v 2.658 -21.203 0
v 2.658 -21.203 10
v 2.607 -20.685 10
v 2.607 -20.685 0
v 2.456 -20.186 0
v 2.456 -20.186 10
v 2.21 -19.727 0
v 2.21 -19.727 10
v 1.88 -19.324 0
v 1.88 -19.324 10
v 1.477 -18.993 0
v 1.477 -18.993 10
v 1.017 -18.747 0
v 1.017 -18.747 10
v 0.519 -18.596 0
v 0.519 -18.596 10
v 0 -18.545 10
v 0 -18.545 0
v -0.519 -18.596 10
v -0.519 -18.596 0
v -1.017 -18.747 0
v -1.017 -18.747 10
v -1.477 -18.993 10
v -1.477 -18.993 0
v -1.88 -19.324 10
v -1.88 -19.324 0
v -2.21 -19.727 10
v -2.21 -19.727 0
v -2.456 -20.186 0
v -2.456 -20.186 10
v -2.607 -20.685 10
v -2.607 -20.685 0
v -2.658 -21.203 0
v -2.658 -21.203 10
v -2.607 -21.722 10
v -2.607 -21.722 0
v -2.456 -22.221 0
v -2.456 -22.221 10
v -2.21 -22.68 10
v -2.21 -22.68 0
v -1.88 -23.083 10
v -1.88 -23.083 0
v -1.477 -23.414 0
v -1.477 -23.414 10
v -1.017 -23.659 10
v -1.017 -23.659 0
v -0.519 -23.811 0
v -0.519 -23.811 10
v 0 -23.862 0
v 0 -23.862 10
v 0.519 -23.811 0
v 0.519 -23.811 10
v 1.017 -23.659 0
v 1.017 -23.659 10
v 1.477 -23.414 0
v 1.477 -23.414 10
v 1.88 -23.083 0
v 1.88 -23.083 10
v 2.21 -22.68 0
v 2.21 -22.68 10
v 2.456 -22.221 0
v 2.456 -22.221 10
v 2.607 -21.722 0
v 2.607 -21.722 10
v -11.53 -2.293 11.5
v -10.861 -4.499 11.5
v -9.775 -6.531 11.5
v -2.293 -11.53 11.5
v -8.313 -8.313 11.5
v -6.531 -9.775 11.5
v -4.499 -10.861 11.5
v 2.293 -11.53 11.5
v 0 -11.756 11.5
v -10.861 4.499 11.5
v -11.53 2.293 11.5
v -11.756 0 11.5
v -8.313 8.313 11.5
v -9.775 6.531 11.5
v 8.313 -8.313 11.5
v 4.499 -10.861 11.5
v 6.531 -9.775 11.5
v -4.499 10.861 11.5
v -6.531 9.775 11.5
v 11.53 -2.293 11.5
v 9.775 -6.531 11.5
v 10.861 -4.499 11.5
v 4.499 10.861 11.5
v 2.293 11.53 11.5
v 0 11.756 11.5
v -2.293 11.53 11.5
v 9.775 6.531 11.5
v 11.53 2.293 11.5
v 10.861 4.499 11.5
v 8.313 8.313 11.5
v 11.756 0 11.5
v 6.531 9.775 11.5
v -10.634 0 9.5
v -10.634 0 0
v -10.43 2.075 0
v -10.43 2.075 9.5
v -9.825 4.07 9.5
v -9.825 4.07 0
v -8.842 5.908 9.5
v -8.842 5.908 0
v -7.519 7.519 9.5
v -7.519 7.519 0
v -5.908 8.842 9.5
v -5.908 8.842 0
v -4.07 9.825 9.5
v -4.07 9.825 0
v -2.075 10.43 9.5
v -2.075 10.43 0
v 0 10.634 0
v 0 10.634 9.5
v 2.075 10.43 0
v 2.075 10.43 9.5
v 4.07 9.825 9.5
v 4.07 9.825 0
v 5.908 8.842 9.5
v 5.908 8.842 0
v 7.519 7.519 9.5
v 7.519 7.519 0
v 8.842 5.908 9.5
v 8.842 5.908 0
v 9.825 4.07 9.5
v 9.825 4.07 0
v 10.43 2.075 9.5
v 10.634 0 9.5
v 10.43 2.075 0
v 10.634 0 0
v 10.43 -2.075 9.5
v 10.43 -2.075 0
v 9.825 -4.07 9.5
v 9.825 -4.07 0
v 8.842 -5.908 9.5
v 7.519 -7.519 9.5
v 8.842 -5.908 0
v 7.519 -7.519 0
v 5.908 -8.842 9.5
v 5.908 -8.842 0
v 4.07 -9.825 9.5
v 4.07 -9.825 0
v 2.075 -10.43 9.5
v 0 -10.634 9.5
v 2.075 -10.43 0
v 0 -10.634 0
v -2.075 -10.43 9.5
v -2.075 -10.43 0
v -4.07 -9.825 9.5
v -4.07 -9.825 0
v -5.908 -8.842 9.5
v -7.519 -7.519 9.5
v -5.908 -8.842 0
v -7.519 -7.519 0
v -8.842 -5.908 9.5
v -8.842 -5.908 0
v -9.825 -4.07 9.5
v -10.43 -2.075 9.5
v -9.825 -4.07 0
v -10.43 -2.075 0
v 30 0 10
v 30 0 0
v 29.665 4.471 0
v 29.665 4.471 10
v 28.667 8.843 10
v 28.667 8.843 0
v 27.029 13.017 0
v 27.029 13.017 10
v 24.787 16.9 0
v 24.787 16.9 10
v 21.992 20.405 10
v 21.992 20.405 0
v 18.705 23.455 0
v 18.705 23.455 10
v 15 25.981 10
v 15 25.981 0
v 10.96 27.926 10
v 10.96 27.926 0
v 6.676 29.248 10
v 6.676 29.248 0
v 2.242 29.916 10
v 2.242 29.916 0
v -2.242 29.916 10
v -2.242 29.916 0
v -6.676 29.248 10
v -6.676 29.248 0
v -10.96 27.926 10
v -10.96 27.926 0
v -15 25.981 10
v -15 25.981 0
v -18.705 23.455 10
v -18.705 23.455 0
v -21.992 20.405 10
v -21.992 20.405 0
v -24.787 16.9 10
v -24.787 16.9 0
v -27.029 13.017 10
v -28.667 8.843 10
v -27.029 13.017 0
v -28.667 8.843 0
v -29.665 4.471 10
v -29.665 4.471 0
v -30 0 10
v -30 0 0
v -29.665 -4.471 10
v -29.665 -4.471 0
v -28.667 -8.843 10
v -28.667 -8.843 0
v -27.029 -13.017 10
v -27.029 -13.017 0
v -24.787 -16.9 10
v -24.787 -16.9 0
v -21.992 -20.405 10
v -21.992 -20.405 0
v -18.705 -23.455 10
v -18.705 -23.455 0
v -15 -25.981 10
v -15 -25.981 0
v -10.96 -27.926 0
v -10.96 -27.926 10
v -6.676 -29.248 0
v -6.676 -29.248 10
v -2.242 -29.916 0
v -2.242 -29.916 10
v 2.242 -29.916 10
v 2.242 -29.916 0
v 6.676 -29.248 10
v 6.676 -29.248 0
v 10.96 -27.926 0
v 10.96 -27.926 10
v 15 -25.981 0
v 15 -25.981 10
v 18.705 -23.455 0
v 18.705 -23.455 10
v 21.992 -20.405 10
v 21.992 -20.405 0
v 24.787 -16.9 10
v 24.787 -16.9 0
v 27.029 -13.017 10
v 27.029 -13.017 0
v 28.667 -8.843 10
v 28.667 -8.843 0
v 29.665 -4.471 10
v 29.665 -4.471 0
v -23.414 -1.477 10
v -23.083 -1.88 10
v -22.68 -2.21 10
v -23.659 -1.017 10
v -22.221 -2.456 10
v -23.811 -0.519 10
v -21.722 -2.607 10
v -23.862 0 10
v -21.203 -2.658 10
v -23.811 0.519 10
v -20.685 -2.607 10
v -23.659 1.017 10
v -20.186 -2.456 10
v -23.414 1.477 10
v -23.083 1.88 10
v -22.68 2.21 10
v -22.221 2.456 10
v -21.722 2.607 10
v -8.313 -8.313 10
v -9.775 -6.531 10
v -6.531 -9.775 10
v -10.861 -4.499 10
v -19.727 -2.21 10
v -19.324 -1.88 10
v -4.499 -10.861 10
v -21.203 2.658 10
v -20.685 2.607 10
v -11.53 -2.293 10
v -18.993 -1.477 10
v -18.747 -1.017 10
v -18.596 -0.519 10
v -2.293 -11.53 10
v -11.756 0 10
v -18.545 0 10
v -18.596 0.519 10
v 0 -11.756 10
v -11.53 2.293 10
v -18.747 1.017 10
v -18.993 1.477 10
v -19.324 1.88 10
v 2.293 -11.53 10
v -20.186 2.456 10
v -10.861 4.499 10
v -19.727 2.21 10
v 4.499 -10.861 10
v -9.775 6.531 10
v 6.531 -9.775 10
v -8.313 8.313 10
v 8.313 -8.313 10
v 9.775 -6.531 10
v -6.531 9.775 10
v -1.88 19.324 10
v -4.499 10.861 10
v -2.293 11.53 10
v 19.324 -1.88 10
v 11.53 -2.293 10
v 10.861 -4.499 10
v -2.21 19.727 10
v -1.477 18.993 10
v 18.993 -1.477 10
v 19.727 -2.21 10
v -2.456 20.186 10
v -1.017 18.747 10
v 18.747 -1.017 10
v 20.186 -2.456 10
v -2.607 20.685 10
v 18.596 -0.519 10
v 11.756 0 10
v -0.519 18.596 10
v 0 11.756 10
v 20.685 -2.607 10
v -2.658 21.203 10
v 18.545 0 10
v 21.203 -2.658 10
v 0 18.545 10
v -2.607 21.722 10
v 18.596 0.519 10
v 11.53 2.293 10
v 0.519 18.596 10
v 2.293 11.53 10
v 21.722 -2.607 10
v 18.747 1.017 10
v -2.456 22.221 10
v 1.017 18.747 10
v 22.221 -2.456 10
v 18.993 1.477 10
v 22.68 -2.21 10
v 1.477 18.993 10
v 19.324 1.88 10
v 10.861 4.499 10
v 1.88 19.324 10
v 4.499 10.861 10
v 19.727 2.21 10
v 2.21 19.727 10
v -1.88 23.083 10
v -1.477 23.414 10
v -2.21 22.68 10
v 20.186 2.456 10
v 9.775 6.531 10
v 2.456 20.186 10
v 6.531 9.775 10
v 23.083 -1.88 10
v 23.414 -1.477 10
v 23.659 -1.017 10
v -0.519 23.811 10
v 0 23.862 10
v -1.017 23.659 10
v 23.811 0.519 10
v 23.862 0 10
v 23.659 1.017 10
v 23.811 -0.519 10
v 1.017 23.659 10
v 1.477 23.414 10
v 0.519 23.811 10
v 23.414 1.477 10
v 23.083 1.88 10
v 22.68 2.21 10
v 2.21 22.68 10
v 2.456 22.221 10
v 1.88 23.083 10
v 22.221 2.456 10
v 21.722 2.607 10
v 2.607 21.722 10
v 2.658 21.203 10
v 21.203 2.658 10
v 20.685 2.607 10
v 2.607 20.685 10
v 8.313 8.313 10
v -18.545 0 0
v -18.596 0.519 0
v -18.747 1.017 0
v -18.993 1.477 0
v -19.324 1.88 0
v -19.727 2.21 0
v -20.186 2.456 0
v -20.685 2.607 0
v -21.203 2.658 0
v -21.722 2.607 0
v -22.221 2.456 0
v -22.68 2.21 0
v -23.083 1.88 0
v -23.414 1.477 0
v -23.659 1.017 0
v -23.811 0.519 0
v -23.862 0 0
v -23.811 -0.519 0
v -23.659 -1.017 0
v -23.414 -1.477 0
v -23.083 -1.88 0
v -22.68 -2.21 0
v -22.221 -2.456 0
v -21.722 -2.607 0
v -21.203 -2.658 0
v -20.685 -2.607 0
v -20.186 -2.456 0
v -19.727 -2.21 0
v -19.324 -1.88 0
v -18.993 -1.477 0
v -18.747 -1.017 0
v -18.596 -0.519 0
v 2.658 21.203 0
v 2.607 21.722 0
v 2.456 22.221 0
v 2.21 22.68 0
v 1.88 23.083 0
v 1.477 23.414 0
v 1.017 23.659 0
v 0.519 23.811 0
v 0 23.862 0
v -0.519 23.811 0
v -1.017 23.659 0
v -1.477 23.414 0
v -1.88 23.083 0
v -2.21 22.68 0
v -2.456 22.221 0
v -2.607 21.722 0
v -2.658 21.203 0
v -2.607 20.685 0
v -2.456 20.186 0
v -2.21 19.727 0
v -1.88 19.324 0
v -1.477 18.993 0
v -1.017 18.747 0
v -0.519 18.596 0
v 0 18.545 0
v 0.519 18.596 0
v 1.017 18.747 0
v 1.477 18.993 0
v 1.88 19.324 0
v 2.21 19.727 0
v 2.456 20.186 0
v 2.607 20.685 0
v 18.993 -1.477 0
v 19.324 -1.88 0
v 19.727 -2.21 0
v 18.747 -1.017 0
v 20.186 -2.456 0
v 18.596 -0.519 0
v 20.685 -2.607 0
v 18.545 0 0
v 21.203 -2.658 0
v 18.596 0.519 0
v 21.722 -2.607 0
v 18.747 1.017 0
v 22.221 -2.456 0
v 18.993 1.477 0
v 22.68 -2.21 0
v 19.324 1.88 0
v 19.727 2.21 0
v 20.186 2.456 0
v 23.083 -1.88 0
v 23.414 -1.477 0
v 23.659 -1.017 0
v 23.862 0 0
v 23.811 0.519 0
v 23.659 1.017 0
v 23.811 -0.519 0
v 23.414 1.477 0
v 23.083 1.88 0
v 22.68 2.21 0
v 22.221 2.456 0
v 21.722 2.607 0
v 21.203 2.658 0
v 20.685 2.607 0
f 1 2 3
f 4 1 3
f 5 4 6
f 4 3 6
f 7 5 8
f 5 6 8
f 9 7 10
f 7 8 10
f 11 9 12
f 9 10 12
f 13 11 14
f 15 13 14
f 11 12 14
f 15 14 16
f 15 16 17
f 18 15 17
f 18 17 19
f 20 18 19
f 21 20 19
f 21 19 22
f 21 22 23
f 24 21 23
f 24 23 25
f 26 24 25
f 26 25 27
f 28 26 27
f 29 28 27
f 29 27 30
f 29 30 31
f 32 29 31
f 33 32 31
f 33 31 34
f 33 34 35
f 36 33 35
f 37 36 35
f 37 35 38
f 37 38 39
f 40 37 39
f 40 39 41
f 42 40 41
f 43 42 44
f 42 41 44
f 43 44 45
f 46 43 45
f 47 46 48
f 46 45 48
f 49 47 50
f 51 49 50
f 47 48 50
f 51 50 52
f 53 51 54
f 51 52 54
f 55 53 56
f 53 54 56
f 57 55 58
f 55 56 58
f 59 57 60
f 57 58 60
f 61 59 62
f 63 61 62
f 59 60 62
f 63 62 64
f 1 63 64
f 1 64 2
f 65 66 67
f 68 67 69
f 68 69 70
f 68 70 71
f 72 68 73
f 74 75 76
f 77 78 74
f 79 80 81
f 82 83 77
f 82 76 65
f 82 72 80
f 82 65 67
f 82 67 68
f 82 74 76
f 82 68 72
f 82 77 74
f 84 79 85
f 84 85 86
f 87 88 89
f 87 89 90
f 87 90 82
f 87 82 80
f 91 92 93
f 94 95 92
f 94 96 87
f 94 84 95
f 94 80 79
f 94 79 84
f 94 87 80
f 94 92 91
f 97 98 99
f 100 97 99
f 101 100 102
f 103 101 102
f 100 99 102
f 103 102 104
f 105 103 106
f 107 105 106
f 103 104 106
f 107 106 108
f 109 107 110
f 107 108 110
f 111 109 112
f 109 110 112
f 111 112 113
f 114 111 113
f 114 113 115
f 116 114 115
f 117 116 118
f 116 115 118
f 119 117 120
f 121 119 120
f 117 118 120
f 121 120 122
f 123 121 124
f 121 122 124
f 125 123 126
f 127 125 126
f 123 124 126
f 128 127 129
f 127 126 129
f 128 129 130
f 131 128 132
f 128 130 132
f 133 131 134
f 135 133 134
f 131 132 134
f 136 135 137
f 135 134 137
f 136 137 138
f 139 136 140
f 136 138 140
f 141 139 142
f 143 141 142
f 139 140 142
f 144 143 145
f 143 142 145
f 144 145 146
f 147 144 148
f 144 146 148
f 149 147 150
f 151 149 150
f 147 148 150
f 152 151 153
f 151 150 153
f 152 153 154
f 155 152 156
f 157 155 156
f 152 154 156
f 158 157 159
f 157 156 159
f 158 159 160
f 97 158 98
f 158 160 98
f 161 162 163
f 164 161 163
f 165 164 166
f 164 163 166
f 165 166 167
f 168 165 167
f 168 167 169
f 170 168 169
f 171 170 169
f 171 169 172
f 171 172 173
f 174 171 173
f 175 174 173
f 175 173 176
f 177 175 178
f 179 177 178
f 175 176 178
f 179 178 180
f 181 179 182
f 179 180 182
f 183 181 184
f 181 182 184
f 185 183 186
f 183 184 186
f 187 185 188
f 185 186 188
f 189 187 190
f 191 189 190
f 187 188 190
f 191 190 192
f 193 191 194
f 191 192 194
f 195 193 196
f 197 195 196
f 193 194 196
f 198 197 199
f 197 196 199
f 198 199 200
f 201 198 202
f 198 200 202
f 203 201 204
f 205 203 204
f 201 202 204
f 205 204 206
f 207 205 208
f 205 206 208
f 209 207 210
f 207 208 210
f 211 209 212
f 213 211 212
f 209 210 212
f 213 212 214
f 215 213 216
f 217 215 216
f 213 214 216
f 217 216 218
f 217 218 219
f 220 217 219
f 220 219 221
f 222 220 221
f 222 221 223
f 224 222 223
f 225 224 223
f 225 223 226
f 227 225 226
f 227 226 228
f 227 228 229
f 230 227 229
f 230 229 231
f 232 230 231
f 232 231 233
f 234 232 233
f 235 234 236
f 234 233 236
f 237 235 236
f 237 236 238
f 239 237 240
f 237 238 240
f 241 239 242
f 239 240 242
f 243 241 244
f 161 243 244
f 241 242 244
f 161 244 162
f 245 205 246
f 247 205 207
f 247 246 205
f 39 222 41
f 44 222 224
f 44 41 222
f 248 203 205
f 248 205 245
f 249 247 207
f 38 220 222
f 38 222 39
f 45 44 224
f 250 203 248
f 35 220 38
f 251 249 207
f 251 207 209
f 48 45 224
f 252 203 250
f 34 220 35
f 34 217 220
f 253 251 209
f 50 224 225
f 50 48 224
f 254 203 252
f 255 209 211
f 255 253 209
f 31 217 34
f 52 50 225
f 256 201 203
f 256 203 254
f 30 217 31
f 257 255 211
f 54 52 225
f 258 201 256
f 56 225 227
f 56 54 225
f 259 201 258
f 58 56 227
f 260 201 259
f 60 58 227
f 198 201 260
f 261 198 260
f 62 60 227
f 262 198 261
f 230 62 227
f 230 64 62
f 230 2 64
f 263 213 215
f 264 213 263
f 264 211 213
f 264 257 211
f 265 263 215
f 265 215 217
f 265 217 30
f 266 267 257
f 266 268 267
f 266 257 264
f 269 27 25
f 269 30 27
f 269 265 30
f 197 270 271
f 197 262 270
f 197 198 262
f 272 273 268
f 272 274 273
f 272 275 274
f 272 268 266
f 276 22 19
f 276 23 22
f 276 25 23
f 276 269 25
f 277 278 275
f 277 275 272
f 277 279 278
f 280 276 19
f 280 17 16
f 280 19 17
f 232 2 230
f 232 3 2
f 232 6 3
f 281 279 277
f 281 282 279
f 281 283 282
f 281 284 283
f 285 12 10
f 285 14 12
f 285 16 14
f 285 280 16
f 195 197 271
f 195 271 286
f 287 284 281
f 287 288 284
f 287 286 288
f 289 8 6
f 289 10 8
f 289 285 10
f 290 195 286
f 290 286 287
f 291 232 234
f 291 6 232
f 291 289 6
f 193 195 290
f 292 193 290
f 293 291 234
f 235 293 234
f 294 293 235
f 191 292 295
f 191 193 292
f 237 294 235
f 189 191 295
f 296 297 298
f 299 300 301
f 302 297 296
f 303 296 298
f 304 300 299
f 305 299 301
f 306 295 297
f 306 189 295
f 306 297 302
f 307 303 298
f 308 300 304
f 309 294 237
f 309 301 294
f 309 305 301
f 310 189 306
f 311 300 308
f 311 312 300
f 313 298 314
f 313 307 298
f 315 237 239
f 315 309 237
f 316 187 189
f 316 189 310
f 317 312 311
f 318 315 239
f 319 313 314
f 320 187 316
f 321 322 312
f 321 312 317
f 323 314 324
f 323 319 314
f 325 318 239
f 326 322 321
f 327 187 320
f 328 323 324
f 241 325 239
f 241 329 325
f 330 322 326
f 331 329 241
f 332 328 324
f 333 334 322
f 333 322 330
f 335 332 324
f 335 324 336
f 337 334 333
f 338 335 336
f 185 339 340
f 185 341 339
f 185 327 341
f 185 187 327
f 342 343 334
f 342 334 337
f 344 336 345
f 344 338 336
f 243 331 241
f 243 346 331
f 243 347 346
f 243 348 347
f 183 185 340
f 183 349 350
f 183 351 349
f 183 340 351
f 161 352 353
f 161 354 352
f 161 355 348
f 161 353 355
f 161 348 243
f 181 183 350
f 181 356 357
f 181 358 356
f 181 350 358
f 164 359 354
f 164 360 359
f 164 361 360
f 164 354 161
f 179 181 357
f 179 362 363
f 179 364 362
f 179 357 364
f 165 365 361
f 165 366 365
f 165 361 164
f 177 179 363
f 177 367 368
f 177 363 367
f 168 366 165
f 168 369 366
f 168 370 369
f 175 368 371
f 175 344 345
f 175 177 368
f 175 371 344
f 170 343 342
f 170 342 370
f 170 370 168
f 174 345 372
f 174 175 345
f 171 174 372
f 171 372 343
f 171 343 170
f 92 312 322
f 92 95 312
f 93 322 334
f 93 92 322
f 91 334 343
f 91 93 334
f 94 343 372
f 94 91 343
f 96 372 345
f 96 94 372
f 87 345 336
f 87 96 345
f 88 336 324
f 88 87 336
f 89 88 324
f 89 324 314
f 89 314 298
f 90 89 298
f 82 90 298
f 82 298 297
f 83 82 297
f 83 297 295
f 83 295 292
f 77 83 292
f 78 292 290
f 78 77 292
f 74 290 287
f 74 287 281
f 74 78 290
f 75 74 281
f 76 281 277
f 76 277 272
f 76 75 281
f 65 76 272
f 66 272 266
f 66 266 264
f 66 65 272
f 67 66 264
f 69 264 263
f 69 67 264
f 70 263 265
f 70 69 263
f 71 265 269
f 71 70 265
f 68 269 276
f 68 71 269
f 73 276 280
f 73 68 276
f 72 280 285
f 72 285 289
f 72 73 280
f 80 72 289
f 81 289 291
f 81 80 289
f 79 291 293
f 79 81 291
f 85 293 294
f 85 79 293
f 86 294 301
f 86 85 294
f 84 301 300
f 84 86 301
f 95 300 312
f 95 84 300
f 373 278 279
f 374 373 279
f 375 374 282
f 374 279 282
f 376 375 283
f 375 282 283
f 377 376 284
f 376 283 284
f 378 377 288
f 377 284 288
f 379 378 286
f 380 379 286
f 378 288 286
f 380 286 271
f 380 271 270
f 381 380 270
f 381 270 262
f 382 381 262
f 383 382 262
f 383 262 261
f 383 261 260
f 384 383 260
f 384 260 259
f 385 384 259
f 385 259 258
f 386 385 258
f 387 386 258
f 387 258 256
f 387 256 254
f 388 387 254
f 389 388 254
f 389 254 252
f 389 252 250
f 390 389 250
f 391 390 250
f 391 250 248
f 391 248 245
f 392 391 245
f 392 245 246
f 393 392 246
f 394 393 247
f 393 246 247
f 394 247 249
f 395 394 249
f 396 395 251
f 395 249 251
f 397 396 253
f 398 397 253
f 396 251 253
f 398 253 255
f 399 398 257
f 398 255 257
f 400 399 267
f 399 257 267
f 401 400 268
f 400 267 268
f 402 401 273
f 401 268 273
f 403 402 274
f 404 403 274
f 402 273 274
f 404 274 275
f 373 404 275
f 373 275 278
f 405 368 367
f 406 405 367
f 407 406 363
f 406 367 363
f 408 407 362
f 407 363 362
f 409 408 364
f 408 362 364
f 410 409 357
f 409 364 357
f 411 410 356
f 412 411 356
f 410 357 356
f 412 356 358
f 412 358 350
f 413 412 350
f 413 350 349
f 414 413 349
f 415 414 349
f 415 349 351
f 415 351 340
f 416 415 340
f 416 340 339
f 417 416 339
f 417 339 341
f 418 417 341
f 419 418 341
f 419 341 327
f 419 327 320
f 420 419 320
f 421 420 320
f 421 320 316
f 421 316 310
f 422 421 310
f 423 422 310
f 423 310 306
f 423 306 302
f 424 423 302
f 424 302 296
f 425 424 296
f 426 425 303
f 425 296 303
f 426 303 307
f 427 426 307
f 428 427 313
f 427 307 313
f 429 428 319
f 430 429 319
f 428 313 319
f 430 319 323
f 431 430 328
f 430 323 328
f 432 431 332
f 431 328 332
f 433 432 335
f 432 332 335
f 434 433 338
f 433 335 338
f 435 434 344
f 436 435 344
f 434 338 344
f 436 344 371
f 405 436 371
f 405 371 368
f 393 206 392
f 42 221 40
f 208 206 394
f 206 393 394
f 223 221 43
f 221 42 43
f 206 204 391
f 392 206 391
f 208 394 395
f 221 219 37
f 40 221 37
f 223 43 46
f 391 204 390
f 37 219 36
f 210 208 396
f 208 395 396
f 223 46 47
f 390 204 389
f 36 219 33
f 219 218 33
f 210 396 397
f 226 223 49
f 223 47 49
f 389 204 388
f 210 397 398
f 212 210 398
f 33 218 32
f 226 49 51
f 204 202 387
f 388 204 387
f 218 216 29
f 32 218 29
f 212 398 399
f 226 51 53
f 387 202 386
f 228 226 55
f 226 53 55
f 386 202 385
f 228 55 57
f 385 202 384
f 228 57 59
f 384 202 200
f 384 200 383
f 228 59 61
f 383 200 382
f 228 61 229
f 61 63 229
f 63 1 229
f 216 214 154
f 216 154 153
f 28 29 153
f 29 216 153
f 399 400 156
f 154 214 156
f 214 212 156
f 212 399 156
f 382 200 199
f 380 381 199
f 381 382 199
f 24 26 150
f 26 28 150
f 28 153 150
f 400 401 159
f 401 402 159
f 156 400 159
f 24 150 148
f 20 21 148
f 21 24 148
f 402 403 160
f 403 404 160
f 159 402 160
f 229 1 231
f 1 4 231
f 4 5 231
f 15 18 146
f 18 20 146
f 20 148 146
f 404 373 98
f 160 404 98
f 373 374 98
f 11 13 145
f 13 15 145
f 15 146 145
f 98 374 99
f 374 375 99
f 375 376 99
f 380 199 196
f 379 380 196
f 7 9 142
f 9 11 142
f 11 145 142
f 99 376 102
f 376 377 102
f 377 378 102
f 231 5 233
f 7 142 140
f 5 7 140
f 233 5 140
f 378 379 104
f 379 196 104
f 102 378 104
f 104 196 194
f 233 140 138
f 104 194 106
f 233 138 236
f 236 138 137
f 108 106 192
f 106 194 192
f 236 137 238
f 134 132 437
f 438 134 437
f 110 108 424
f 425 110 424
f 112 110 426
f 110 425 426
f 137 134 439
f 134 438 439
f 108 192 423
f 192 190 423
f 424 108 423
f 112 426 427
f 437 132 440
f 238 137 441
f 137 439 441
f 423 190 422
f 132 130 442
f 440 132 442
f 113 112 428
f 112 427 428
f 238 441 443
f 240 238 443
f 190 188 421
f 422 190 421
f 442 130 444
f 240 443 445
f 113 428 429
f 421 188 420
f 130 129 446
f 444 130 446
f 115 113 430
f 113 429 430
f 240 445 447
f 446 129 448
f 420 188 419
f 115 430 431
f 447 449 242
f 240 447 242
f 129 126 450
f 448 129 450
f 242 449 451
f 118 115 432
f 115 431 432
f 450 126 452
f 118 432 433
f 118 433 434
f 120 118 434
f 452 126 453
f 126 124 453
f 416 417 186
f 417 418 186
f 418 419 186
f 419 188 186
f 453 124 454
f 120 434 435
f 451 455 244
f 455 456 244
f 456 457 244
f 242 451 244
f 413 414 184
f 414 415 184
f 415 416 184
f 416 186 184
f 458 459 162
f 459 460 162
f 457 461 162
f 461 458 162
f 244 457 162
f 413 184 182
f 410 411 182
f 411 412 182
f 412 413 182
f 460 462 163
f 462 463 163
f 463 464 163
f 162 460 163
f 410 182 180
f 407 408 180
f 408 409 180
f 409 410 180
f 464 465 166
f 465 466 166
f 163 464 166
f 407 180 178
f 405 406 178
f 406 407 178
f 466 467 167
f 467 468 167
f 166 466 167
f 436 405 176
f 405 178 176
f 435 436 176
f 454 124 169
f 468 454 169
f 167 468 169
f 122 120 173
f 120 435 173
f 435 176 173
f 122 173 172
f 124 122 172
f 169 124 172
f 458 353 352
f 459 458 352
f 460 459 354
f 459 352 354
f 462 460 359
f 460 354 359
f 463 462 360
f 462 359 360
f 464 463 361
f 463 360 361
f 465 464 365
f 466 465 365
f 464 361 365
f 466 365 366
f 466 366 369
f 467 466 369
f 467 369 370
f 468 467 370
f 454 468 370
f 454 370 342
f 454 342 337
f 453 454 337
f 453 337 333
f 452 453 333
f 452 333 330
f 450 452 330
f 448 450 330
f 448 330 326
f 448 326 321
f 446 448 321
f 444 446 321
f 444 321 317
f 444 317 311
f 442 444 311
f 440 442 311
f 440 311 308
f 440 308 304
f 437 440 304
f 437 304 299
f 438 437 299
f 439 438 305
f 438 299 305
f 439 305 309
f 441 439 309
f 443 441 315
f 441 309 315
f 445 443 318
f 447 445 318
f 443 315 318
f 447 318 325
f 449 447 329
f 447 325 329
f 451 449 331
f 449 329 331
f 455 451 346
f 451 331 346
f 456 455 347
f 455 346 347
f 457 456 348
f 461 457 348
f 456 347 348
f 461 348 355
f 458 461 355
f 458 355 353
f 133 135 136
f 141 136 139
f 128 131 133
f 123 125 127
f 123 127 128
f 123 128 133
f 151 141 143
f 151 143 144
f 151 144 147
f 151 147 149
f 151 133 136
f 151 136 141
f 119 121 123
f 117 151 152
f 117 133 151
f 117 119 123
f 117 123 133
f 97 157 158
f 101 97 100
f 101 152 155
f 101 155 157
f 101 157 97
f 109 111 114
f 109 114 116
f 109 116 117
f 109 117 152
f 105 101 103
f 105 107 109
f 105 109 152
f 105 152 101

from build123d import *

# Parameters (mm, degrees)
SKETCH1_R           = 30
BOSS_EXTRUDE1_DEPTH = 10
SKETCH2_R           = 11.755971956
BOSS_EXTRUDE3_DEPTH = 1.5
SKETCH5_R           = 2.658250205
CUT_EXTRUDE4_DEPTH  = 26
SKETCH6_R           = 10.634150048
CUT_EXTRUDE5_DEPTH  = 9.5


with BuildPart() as part:
    # Sketch1 → Boss-Extrude1 (new body)
    with BuildSketch(Plane.XY):
        Circle(SKETCH1_R)
    extrude(amount=BOSS_EXTRUDE1_DEPTH)

    # Sketch2 → Boss-Extrude3 (add, symmetric)
    with BuildSketch(Plane.XY.offset(10)):
        Circle(SKETCH2_R)
    extrude(amount=BOSS_EXTRUDE3_DEPTH, both=True)

    # Sketch5 → Cut-Extrude4 (cut)
    with BuildSketch(Plane.XY.offset(10)):
        with Locations((0, -21.20336232)):
            Circle(SKETCH5_R)
        with Locations((-21.20336232, 0)):
            Circle(SKETCH5_R)
        with Locations((0, 21.20336232)):
            Circle(SKETCH5_R)
        with Locations((21.20336232, 0)):
            Circle(SKETCH5_R)
    extrude(amount=-CUT_EXTRUDE4_DEPTH, mode=Mode.SUBTRACT)

    # Sketch6 → Cut-Extrude5 (cut)
    with BuildSketch(Plane(origin=(0, 0, 0), x_dir=(-1, 0, 0), z_dir=(0, 0, -1))):
        Circle(SKETCH6_R)
    extrude(amount=-CUT_EXTRUDE5_DEPTH, mode=Mode.SUBTRACT)


solid = part.part
